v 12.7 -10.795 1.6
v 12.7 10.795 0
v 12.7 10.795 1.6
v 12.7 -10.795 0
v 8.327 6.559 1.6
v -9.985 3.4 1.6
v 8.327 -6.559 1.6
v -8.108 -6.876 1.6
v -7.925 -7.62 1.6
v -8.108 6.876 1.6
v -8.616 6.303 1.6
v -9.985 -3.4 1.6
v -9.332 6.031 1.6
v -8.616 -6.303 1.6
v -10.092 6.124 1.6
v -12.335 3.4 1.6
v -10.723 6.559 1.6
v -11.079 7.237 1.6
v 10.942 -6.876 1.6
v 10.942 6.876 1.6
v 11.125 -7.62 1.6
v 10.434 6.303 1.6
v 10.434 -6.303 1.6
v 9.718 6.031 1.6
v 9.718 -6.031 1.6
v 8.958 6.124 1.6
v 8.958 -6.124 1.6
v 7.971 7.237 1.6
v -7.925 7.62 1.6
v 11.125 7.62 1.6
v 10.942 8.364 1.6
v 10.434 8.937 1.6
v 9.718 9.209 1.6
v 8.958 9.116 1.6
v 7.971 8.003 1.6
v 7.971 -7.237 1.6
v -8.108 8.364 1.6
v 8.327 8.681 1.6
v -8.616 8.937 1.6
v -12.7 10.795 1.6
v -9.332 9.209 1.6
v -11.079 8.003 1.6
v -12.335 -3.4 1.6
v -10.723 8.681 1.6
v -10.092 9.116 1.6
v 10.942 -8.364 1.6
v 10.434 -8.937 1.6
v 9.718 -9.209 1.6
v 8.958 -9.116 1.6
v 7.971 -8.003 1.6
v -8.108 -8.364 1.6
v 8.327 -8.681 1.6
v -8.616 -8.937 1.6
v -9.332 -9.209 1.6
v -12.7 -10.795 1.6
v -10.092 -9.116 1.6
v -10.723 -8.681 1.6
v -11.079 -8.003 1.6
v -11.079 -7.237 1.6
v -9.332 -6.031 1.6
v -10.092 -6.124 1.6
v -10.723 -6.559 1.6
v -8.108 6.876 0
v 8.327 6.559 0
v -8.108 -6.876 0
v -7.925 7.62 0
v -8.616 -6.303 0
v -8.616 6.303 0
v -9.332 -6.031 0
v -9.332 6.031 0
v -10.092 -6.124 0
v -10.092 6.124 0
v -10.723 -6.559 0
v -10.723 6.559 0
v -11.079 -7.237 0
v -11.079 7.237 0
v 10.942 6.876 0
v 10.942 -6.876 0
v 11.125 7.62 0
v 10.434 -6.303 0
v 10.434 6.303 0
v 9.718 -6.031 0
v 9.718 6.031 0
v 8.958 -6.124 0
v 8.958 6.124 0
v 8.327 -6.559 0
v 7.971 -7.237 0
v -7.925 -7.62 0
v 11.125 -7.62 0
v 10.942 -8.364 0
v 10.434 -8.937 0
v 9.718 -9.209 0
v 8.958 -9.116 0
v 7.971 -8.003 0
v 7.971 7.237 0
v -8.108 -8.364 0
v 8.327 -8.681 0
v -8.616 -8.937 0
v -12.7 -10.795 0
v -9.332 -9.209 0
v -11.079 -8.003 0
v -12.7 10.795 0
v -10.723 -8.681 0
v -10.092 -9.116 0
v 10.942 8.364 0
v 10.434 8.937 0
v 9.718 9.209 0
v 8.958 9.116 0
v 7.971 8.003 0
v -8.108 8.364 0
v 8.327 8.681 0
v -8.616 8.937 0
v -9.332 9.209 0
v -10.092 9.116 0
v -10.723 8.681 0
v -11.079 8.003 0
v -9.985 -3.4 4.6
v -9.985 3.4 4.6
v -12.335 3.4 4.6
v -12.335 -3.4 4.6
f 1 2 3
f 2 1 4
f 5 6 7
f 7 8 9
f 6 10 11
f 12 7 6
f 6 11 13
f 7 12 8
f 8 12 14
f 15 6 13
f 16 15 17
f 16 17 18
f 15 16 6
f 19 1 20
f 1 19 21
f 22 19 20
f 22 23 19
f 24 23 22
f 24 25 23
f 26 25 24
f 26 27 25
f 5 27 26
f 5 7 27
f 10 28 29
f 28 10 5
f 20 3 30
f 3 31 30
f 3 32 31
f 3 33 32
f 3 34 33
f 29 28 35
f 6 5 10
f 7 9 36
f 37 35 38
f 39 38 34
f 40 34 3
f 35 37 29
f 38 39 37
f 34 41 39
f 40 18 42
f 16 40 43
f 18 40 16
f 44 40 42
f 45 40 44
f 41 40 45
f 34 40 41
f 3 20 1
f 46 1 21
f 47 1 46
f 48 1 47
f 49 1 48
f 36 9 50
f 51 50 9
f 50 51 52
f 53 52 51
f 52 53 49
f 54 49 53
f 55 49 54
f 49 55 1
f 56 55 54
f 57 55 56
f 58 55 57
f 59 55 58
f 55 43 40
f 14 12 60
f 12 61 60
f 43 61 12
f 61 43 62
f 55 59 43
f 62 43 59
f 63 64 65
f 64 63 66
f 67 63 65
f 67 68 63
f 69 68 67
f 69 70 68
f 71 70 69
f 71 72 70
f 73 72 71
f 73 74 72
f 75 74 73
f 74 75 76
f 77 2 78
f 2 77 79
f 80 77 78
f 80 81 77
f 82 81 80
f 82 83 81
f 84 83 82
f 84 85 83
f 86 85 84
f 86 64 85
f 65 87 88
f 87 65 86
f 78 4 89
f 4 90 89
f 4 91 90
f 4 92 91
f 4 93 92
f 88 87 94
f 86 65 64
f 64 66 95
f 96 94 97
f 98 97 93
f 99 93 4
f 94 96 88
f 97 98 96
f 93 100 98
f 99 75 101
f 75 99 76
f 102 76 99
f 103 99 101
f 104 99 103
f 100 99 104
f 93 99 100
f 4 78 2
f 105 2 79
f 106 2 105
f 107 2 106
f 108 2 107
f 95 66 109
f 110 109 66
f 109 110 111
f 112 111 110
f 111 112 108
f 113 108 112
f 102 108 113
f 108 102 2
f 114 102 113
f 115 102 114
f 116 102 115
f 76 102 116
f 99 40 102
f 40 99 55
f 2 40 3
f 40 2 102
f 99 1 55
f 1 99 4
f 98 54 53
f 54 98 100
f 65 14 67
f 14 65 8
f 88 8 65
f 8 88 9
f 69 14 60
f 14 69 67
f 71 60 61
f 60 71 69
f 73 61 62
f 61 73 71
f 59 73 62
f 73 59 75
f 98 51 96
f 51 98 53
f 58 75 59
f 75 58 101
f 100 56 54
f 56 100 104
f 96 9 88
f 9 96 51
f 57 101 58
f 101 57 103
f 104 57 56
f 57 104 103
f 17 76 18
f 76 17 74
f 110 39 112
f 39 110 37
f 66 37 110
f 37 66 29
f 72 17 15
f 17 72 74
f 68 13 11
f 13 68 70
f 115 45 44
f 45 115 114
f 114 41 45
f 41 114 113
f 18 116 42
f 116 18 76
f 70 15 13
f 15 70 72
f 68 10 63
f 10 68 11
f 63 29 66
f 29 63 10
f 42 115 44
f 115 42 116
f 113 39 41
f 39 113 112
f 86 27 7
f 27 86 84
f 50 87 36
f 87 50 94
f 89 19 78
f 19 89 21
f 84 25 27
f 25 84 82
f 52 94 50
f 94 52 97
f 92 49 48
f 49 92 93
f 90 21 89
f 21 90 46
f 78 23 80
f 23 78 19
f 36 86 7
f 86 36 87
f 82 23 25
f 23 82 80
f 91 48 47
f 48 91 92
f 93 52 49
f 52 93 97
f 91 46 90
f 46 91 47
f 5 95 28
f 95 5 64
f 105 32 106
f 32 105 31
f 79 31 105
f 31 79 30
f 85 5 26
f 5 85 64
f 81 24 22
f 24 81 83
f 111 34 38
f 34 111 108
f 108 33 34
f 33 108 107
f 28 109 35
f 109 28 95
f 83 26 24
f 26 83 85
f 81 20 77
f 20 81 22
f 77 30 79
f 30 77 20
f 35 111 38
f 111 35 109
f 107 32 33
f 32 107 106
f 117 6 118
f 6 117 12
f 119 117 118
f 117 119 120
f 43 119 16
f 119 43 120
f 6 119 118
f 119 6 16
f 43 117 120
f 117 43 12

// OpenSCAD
// file: utils.scad
//
// general utility functions for OpenSCAD
//
function inch(in) = 25.4*in;
// main file
use <utils.scad>;

module sensor_board()
{
  epsilon = 1;
  color("purple") difference(){
    translate([-inch(1.)/2, -inch(0.85)/2, 0]){
      cube([inch(1.), inch(0.85), 1.6]);
    }
    translate([inch(-0.75/2), inch(-0.6/2), -epsilon]){
      cylinder($fn=13, d=inch(.126), h=1.6+2*epsilon);
    }
    translate([inch(-0.75/2), inch(+0.6/2), -epsilon]){
      cylinder($fn=13, d=inch(.126), h=1.6+2*epsilon);
    }
    translate([inch(+0.75/2), inch(-0.6/2), -epsilon]){
      cylinder($fn=13, d=inch(.126), h=1.6+2*epsilon);
    }
    translate([inch(+0.75/2), inch(+0.6/2), -epsilon]){
      cylinder($fn=13, d=inch(.126), h=1.6+2*epsilon);
    }
  }
  translate([-inch(0.5)-2.35/2+inch(0.1)-1, -6.8/2, 1.6]){
    color("white") cube([2.35, 6.8, 3]);
    translate([0, 6.8/2, 1.95]){
      cone_len = 20;
      rotate([0, -90, 0]) %cylinder(r1=0.5, r2=0.5 + cone_len*tan(55), h=cone_len);
    }
  }
}

sensor_board();
